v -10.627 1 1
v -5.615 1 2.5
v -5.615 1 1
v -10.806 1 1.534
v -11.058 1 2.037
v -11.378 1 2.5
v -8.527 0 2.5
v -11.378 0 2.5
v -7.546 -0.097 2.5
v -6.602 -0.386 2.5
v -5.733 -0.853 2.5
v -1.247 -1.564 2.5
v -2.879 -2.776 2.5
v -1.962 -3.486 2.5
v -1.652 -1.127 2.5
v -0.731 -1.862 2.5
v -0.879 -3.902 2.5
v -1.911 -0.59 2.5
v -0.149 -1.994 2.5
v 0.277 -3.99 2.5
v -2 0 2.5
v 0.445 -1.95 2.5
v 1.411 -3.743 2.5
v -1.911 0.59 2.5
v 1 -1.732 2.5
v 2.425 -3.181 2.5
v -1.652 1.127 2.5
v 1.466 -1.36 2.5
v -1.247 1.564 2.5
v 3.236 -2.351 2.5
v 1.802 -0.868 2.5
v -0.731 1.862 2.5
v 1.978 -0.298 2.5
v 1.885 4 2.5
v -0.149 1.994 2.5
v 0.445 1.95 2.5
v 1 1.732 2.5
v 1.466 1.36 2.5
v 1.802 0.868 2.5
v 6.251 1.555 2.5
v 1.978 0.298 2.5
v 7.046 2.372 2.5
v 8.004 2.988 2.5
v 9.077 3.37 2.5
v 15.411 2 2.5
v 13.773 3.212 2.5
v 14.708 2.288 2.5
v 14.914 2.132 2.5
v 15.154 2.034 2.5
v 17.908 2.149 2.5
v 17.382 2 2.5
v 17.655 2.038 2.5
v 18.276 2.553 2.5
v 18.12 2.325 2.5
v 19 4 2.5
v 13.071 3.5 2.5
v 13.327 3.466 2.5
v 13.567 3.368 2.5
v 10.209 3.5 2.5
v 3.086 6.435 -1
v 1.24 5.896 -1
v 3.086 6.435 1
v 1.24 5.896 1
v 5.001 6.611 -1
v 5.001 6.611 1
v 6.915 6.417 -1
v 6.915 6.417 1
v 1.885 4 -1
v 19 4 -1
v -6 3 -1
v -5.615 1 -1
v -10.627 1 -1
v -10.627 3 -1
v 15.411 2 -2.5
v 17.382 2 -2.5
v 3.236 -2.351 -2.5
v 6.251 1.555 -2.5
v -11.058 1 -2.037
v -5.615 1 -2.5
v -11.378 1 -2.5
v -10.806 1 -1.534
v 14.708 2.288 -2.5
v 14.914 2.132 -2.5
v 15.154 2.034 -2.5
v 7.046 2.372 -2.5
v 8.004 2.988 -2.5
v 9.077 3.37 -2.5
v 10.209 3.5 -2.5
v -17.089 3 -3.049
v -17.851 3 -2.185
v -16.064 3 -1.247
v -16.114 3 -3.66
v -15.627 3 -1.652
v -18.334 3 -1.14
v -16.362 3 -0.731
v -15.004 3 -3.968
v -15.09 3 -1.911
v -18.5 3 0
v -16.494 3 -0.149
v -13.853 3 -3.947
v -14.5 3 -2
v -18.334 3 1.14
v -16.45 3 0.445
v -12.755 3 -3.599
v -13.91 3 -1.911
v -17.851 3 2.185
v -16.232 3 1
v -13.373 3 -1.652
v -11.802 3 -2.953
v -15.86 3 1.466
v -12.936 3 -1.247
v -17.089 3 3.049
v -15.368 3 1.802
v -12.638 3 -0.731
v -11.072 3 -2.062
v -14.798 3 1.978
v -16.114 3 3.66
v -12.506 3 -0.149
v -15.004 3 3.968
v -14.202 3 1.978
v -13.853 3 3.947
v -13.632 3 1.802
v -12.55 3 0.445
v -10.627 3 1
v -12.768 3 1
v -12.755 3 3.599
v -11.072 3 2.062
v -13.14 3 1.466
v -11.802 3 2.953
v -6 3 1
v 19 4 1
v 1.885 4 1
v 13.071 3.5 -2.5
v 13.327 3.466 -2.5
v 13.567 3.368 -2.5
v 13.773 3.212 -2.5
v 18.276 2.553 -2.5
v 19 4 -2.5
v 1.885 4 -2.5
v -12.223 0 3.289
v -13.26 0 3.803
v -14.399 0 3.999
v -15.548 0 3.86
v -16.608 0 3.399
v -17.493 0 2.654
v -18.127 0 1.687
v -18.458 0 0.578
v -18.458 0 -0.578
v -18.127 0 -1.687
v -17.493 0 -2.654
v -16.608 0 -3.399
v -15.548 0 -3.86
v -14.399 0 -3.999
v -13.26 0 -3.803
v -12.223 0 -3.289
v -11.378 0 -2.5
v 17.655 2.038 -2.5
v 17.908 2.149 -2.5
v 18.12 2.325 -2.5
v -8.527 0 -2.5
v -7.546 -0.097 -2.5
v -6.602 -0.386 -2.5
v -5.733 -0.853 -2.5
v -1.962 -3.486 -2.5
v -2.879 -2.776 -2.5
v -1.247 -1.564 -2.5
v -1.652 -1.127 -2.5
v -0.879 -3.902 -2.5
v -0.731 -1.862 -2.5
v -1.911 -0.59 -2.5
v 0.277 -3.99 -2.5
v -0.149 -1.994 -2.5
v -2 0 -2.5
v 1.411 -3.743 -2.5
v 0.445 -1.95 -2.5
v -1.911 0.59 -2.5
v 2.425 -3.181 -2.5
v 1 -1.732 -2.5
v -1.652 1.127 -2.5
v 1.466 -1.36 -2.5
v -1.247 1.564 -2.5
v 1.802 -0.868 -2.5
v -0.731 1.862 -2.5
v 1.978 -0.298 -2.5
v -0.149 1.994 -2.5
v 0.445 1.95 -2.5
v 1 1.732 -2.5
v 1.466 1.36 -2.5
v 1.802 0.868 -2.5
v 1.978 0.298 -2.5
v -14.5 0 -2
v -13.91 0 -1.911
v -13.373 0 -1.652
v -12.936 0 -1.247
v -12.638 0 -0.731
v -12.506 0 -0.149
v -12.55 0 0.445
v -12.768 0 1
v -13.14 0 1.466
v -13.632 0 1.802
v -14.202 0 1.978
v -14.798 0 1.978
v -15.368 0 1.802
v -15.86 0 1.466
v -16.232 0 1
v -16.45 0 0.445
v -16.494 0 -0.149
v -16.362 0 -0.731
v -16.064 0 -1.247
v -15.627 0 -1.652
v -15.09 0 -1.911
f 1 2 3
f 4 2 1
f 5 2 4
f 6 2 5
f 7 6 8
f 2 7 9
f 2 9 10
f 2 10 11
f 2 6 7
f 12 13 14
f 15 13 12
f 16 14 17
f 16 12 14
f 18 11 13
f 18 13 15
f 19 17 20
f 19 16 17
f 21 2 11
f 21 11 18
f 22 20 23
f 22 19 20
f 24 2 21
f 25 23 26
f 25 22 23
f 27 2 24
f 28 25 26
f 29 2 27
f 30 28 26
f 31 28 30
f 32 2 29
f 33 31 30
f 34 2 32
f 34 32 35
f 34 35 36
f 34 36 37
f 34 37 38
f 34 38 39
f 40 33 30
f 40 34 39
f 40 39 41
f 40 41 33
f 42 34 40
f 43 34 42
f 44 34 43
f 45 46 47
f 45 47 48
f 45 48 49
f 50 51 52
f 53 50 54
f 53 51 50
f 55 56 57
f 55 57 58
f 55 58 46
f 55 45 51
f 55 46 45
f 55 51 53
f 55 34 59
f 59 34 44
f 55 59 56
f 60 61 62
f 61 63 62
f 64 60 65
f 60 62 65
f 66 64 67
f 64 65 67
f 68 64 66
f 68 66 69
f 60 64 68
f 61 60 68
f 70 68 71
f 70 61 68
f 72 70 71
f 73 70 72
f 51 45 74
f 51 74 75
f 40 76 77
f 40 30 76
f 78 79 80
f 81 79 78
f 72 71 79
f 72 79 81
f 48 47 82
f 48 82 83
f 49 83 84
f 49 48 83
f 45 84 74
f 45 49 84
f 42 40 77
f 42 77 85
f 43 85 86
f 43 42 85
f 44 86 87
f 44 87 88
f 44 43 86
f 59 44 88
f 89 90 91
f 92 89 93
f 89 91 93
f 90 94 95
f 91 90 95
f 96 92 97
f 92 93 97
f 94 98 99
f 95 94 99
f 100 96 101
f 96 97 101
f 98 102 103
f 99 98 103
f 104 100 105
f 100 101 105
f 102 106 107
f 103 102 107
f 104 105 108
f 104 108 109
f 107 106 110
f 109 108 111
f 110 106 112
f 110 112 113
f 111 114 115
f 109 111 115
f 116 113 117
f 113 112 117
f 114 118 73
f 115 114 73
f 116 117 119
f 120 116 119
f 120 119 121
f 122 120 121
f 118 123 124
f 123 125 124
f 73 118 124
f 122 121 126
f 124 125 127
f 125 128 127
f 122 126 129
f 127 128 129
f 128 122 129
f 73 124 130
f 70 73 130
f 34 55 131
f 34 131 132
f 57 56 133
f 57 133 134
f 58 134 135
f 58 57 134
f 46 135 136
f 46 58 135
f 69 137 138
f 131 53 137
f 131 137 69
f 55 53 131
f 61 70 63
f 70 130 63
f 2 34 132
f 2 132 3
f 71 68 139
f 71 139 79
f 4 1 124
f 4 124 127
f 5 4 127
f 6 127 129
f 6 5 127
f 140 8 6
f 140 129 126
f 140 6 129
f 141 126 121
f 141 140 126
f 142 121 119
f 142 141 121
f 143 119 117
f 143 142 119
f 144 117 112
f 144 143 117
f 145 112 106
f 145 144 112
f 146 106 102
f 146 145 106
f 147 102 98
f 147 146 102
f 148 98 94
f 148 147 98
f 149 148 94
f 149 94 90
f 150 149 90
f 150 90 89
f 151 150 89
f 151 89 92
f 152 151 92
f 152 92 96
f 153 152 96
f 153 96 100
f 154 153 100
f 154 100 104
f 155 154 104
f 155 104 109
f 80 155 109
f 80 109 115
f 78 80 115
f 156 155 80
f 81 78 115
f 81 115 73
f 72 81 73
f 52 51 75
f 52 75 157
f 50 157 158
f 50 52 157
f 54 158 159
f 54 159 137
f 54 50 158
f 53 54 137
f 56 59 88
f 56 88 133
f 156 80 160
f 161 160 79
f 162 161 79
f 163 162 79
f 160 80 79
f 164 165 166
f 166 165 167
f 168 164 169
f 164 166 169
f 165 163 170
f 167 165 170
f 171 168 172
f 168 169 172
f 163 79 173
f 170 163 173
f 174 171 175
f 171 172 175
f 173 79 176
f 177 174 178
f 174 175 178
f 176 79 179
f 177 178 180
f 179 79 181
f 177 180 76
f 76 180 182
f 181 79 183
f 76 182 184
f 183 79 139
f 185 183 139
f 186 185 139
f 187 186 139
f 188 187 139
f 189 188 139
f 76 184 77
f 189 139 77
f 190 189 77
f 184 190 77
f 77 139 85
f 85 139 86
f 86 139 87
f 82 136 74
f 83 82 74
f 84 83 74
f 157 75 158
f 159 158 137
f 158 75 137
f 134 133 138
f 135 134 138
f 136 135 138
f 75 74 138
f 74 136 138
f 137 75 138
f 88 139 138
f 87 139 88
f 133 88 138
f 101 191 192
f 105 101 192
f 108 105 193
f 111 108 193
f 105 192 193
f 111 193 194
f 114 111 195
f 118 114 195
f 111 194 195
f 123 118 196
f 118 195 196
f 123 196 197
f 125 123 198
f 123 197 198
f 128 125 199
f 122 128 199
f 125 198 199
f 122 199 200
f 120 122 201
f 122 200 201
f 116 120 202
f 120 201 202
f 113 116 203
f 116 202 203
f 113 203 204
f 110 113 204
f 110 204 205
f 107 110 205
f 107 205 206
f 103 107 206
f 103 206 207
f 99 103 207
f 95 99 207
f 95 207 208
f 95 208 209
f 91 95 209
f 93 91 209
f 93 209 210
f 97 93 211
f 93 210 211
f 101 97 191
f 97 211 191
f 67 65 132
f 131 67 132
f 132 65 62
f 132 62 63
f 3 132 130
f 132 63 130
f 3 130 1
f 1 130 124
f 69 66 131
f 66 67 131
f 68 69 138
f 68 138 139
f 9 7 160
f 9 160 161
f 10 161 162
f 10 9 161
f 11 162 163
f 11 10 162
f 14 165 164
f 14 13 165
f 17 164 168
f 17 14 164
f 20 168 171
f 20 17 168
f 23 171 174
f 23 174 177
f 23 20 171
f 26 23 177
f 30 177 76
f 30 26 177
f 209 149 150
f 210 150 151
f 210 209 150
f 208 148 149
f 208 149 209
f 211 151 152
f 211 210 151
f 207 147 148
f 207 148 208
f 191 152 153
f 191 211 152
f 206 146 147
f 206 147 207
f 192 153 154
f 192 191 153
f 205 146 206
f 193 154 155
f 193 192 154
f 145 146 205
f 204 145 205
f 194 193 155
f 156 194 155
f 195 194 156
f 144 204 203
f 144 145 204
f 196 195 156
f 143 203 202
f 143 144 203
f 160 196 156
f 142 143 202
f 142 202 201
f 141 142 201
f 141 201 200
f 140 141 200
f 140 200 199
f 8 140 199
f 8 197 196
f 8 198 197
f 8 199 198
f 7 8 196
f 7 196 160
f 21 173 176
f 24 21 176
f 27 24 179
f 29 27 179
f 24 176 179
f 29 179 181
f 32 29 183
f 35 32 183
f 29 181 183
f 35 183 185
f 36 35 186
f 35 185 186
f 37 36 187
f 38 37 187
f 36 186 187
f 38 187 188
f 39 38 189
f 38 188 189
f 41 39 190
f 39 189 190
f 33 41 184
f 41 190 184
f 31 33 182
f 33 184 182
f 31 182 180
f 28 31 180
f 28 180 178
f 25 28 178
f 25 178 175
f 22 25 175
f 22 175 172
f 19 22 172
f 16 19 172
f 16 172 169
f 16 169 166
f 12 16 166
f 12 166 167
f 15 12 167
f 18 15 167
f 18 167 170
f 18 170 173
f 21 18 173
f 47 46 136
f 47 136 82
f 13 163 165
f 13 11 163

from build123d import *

# Parameters (mm, degrees)
BASE_EXTRUSION_DEPTH    = 1
BOSS_EXTRU_1_DEPTH      = 2.5
ESQUISSE3_R             = 4
ESQUISSE3_R_2           = 2
BOSS_EXTRU_2_DEPTH      = 3
ESQUISSE4_R             = 2
ENL_V_MAT_EXTRU_1_DEPTH = 22.141379606


with BuildPart() as part:
    # Esquisse1 → Base-Extrusion (new, symmetric)
    with BuildSketch(Plane.XY):
        with BuildLine():
            Line((-5.614835193, 1), (-12, 1))
            Line((-12, 1), (-12, 3))
            Line((-12, 3), (-6, 3))
            Line((-6, 3), (1.239910882, 5.895964353))
            ThreePointArc((1.239910882, 5.895964353), (4.039542112, 6.569314748), (6.914978997, 6.417004201))
            Line((6.914978997, 6.417004201), (19, 4))
            Line((19, 4), (1.885164807, 4))
            Line((1.885164807, 4), (-5.614835193, 1))
        make_face()
    extrude(amount=BASE_EXTRUSION_DEPTH, both=True)

    # Esquisse2 → Boss.-Extru.1 (add, symmetric)
    with BuildSketch(Plane.XY):
        with BuildLine():
            Line((3.235852124, -2.351438077), (6.251216165, 1.555118833))
            ThreePointArc((6.251216165, 1.555118833), (8.004237079, 2.987515692), (10.209277422, 3.5))
            Line((10.209277422, 3.5), (13.070517185, 3.5))
            ThreePointArc((13.070517185, 3.5), (13.450300787, 3.425075357), (13.773174087, 3.211528832))
            Line((13.773174087, 3.211528832), (14.707886519, 2.288471168))
            ThreePointArc((14.707886519, 2.288471168), (15.030759819, 2.074924643), (15.410543421, 2))
            Line((15.410543421, 2), (17.381966011, 2))
            ThreePointArc((17.381966011, 2), (17.907697123, 2.149349192), (18.276393202, 2.552786405))
            Line((18.276393202, 2.552786405), (19, 4))
            Line((19, 4), (1.885164807, 4))
            Line((1.885164807, 4), (-5.614835193, 1))
            Line((-5.614835193, 1), (-12, 1))
            Line((-12, 1), (-12, 0))
            Line((-12, 0), (-8.52733926, 0))
            ThreePointArc((-8.52733926, 0), (-7.066630162, -0.218124957), (-5.733367907, -0.853468427))
            Line((-5.733367907, -0.853468427), (-2.879455607, -2.776460951))
            ThreePointArc((-2.879455607, -2.776460951), (0.277336853, -3.990373951), (3.235852124, -2.351438077))
        make_face()
    extrude(amount=BOSS_EXTRU_1_DEPTH, both=True)

    # Esquisse3 → Boss.-Extru.2 (add)
    with BuildSketch(Plane.XZ):
        with Locations((-14.5, 0)):
            Circle(ESQUISSE3_R)
        with Locations((-14.5, 0)):
            Circle(ESQUISSE3_R_2, mode=Mode.SUBTRACT)
    extrude(amount=-BOSS_EXTRU_2_DEPTH)

    # Esquisse4 → Enlèv. mat.-Extru.1 (cut, through all)
    with BuildSketch(Plane(origin=(0, 0, -2.5), x_dir=(-1, 0, 0), z_dir=(0, 0, -1))):
        Circle(ESQUISSE4_R)
    extrude(amount=-ENL_V_MAT_EXTRU_1_DEPTH, mode=Mode.SUBTRACT)


solid = part.part
